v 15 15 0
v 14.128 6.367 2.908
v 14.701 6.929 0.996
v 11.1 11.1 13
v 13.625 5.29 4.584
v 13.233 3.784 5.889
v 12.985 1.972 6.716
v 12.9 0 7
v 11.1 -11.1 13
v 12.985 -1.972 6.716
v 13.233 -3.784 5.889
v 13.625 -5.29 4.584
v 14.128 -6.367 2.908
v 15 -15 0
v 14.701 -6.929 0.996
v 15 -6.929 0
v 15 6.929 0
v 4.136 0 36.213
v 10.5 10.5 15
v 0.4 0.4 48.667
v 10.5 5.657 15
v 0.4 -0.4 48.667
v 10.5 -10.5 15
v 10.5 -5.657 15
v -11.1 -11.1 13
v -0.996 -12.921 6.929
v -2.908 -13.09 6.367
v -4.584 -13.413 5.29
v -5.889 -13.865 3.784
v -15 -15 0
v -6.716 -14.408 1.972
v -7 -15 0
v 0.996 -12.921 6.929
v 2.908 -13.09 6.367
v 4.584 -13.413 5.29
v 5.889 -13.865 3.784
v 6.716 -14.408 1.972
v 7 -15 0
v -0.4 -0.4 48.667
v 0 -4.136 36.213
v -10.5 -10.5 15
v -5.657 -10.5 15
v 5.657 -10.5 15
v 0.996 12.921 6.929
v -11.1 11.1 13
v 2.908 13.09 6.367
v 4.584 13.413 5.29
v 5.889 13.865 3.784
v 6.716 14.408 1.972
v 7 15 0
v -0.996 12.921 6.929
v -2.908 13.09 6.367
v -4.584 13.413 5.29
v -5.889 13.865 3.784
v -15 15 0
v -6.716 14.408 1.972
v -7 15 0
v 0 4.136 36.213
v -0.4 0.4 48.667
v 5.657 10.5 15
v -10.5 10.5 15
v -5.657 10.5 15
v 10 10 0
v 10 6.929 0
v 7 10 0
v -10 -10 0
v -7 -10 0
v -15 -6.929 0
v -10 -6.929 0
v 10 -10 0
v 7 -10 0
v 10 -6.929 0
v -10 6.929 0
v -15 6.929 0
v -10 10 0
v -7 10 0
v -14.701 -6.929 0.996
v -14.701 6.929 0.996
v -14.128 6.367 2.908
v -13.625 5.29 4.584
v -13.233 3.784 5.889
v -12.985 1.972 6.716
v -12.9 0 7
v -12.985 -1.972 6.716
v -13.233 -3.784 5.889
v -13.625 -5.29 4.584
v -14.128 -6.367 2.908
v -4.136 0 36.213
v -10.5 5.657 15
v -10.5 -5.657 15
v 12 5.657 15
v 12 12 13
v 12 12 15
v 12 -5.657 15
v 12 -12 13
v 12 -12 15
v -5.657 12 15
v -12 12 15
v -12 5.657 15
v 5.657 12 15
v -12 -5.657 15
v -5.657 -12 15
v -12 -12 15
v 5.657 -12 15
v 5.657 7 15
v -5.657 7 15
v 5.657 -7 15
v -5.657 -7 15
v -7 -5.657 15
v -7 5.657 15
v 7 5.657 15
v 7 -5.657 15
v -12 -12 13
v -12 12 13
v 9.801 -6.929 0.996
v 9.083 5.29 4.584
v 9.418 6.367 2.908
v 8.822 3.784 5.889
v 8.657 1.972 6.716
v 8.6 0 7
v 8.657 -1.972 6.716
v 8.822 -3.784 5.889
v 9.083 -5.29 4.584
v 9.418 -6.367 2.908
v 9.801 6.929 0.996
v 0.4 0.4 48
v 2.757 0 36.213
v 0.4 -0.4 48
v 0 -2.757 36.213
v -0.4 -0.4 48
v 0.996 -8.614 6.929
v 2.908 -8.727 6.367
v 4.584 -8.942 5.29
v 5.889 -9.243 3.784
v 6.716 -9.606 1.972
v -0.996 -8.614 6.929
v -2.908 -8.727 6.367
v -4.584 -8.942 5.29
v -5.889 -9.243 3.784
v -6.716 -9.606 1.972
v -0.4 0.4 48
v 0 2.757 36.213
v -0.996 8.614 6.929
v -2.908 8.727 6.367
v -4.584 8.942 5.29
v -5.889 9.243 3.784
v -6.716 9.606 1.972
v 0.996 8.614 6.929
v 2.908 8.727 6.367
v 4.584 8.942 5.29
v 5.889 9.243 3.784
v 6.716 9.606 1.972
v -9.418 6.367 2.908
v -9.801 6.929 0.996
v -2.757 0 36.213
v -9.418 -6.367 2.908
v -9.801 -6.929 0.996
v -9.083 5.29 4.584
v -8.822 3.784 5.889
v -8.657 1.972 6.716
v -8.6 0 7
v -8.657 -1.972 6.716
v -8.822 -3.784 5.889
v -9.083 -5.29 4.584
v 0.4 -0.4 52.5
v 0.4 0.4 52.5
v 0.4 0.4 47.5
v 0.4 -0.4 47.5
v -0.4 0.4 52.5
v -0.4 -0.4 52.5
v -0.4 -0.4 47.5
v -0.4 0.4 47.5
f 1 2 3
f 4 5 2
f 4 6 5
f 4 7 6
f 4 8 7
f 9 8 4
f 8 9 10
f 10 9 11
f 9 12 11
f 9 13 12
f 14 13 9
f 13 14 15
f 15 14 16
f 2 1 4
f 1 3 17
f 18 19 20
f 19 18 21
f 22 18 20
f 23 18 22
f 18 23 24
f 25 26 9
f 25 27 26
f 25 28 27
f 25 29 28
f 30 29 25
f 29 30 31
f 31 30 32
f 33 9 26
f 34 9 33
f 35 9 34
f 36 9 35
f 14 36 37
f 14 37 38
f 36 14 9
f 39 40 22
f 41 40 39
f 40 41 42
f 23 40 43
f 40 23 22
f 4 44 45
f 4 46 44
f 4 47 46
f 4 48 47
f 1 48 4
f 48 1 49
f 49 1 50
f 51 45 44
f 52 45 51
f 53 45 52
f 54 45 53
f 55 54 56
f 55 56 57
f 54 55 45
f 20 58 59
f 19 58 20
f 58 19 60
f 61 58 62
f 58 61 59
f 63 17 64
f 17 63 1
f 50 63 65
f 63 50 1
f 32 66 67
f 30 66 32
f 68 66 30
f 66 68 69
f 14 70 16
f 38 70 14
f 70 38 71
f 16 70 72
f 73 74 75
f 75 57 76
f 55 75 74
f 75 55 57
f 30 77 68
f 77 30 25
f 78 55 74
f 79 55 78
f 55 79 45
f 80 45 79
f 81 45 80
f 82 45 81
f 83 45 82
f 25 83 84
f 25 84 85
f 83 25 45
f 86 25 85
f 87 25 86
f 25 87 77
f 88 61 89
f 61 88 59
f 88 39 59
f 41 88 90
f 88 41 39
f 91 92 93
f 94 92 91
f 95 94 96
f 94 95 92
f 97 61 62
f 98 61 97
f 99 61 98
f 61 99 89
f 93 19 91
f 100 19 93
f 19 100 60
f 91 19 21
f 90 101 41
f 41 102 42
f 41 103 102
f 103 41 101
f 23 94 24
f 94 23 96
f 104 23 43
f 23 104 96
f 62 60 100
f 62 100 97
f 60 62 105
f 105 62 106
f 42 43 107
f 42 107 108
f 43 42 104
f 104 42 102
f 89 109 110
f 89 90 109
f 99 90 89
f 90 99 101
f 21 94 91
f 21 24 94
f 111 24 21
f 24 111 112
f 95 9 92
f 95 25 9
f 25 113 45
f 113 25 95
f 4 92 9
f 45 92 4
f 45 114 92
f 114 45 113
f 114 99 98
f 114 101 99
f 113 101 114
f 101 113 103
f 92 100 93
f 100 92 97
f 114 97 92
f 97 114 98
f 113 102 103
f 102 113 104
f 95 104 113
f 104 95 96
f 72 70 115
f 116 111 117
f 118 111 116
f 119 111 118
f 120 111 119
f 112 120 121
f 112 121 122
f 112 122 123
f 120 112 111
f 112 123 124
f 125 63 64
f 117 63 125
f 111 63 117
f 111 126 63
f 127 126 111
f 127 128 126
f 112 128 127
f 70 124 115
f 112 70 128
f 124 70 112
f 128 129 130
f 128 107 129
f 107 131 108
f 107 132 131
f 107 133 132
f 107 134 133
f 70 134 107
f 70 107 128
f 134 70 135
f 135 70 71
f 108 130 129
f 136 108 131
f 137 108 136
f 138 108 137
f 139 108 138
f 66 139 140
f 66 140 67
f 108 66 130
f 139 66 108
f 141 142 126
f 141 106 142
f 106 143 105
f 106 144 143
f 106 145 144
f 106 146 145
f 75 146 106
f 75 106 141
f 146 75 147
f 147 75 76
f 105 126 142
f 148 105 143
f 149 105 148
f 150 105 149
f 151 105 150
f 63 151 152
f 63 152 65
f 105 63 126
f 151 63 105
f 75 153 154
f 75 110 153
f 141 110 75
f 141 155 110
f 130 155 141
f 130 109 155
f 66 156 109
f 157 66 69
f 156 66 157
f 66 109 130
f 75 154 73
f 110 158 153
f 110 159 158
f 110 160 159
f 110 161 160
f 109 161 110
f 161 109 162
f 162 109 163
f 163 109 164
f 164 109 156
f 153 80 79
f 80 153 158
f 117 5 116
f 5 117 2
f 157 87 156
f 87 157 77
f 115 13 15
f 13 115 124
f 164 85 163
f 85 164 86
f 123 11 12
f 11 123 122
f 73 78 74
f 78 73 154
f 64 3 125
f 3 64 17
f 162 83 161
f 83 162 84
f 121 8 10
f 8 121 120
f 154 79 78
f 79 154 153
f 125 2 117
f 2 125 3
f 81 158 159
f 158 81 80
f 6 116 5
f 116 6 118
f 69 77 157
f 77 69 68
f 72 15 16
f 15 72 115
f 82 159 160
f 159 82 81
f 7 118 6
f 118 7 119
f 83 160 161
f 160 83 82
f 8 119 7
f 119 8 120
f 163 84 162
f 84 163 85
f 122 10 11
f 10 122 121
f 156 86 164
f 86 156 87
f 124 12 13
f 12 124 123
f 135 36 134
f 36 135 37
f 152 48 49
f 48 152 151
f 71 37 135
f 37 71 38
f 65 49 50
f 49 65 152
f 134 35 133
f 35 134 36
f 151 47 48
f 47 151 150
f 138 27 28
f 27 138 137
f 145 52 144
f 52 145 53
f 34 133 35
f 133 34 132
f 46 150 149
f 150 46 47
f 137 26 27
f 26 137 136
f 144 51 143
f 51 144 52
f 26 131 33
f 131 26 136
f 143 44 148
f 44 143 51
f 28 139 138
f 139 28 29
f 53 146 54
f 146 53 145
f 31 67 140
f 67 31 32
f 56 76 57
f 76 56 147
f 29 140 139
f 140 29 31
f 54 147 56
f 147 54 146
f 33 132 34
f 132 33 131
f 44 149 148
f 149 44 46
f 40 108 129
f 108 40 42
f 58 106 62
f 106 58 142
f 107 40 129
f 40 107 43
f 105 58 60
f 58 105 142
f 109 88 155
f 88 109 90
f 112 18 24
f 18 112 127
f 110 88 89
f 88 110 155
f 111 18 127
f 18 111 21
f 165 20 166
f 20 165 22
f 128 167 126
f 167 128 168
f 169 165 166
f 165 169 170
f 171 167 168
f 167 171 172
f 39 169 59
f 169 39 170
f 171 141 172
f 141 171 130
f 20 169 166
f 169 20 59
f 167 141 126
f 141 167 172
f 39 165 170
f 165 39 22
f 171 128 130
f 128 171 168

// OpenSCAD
difference(){
  difference(){
      union(){
      //external pyramid
        polyhedron(
          points=[ [15,15,0],[15,-15,0],[-15,-15,0],[-15,15,0],  [0,0,50]  ],                            
          faces=[ [0,1,4],[1,2,4],[2,3,4],[3,0,4],[1,0,3],[2,1,3] ] );
        //floor
        translate([0,0,14]) cube([24,24,2],center=true);
        
    }
      //inner pyramid
      polyhedron(
        points=[ [10,10,0],[10,-10,0],[-10,-10,0],[-10,10,0],  [0,0,50]  ],                            
        faces=[ [0,1,4],[1,2,4],[2,3,4],[3,0,4],[1,0,3],[2,1,3] ] );
    }
    
  
  rotate([0,90,0]) cylinder (h=80, r=7, center=true);
  rotate([90,0,0]) cylinder (h=80, r=7, center=true);
  translate([0,0,15]) rotate([90,0,0]) rotate([0,0,135]) linear_extrude(height = 35, center = true) polygon([[4,4],[15,-15],[-4,-4]] );
  translate([0,0,15]) rotate([0,0,90]) rotate([90,0,0]) rotate([0,0,135]) linear_extrude(height = 35, center = true) polygon([[4,4],[15,-15],[-4,-4]] );


}

translate([0,0,50]) cube([0.8,0.8,5], center=true);
